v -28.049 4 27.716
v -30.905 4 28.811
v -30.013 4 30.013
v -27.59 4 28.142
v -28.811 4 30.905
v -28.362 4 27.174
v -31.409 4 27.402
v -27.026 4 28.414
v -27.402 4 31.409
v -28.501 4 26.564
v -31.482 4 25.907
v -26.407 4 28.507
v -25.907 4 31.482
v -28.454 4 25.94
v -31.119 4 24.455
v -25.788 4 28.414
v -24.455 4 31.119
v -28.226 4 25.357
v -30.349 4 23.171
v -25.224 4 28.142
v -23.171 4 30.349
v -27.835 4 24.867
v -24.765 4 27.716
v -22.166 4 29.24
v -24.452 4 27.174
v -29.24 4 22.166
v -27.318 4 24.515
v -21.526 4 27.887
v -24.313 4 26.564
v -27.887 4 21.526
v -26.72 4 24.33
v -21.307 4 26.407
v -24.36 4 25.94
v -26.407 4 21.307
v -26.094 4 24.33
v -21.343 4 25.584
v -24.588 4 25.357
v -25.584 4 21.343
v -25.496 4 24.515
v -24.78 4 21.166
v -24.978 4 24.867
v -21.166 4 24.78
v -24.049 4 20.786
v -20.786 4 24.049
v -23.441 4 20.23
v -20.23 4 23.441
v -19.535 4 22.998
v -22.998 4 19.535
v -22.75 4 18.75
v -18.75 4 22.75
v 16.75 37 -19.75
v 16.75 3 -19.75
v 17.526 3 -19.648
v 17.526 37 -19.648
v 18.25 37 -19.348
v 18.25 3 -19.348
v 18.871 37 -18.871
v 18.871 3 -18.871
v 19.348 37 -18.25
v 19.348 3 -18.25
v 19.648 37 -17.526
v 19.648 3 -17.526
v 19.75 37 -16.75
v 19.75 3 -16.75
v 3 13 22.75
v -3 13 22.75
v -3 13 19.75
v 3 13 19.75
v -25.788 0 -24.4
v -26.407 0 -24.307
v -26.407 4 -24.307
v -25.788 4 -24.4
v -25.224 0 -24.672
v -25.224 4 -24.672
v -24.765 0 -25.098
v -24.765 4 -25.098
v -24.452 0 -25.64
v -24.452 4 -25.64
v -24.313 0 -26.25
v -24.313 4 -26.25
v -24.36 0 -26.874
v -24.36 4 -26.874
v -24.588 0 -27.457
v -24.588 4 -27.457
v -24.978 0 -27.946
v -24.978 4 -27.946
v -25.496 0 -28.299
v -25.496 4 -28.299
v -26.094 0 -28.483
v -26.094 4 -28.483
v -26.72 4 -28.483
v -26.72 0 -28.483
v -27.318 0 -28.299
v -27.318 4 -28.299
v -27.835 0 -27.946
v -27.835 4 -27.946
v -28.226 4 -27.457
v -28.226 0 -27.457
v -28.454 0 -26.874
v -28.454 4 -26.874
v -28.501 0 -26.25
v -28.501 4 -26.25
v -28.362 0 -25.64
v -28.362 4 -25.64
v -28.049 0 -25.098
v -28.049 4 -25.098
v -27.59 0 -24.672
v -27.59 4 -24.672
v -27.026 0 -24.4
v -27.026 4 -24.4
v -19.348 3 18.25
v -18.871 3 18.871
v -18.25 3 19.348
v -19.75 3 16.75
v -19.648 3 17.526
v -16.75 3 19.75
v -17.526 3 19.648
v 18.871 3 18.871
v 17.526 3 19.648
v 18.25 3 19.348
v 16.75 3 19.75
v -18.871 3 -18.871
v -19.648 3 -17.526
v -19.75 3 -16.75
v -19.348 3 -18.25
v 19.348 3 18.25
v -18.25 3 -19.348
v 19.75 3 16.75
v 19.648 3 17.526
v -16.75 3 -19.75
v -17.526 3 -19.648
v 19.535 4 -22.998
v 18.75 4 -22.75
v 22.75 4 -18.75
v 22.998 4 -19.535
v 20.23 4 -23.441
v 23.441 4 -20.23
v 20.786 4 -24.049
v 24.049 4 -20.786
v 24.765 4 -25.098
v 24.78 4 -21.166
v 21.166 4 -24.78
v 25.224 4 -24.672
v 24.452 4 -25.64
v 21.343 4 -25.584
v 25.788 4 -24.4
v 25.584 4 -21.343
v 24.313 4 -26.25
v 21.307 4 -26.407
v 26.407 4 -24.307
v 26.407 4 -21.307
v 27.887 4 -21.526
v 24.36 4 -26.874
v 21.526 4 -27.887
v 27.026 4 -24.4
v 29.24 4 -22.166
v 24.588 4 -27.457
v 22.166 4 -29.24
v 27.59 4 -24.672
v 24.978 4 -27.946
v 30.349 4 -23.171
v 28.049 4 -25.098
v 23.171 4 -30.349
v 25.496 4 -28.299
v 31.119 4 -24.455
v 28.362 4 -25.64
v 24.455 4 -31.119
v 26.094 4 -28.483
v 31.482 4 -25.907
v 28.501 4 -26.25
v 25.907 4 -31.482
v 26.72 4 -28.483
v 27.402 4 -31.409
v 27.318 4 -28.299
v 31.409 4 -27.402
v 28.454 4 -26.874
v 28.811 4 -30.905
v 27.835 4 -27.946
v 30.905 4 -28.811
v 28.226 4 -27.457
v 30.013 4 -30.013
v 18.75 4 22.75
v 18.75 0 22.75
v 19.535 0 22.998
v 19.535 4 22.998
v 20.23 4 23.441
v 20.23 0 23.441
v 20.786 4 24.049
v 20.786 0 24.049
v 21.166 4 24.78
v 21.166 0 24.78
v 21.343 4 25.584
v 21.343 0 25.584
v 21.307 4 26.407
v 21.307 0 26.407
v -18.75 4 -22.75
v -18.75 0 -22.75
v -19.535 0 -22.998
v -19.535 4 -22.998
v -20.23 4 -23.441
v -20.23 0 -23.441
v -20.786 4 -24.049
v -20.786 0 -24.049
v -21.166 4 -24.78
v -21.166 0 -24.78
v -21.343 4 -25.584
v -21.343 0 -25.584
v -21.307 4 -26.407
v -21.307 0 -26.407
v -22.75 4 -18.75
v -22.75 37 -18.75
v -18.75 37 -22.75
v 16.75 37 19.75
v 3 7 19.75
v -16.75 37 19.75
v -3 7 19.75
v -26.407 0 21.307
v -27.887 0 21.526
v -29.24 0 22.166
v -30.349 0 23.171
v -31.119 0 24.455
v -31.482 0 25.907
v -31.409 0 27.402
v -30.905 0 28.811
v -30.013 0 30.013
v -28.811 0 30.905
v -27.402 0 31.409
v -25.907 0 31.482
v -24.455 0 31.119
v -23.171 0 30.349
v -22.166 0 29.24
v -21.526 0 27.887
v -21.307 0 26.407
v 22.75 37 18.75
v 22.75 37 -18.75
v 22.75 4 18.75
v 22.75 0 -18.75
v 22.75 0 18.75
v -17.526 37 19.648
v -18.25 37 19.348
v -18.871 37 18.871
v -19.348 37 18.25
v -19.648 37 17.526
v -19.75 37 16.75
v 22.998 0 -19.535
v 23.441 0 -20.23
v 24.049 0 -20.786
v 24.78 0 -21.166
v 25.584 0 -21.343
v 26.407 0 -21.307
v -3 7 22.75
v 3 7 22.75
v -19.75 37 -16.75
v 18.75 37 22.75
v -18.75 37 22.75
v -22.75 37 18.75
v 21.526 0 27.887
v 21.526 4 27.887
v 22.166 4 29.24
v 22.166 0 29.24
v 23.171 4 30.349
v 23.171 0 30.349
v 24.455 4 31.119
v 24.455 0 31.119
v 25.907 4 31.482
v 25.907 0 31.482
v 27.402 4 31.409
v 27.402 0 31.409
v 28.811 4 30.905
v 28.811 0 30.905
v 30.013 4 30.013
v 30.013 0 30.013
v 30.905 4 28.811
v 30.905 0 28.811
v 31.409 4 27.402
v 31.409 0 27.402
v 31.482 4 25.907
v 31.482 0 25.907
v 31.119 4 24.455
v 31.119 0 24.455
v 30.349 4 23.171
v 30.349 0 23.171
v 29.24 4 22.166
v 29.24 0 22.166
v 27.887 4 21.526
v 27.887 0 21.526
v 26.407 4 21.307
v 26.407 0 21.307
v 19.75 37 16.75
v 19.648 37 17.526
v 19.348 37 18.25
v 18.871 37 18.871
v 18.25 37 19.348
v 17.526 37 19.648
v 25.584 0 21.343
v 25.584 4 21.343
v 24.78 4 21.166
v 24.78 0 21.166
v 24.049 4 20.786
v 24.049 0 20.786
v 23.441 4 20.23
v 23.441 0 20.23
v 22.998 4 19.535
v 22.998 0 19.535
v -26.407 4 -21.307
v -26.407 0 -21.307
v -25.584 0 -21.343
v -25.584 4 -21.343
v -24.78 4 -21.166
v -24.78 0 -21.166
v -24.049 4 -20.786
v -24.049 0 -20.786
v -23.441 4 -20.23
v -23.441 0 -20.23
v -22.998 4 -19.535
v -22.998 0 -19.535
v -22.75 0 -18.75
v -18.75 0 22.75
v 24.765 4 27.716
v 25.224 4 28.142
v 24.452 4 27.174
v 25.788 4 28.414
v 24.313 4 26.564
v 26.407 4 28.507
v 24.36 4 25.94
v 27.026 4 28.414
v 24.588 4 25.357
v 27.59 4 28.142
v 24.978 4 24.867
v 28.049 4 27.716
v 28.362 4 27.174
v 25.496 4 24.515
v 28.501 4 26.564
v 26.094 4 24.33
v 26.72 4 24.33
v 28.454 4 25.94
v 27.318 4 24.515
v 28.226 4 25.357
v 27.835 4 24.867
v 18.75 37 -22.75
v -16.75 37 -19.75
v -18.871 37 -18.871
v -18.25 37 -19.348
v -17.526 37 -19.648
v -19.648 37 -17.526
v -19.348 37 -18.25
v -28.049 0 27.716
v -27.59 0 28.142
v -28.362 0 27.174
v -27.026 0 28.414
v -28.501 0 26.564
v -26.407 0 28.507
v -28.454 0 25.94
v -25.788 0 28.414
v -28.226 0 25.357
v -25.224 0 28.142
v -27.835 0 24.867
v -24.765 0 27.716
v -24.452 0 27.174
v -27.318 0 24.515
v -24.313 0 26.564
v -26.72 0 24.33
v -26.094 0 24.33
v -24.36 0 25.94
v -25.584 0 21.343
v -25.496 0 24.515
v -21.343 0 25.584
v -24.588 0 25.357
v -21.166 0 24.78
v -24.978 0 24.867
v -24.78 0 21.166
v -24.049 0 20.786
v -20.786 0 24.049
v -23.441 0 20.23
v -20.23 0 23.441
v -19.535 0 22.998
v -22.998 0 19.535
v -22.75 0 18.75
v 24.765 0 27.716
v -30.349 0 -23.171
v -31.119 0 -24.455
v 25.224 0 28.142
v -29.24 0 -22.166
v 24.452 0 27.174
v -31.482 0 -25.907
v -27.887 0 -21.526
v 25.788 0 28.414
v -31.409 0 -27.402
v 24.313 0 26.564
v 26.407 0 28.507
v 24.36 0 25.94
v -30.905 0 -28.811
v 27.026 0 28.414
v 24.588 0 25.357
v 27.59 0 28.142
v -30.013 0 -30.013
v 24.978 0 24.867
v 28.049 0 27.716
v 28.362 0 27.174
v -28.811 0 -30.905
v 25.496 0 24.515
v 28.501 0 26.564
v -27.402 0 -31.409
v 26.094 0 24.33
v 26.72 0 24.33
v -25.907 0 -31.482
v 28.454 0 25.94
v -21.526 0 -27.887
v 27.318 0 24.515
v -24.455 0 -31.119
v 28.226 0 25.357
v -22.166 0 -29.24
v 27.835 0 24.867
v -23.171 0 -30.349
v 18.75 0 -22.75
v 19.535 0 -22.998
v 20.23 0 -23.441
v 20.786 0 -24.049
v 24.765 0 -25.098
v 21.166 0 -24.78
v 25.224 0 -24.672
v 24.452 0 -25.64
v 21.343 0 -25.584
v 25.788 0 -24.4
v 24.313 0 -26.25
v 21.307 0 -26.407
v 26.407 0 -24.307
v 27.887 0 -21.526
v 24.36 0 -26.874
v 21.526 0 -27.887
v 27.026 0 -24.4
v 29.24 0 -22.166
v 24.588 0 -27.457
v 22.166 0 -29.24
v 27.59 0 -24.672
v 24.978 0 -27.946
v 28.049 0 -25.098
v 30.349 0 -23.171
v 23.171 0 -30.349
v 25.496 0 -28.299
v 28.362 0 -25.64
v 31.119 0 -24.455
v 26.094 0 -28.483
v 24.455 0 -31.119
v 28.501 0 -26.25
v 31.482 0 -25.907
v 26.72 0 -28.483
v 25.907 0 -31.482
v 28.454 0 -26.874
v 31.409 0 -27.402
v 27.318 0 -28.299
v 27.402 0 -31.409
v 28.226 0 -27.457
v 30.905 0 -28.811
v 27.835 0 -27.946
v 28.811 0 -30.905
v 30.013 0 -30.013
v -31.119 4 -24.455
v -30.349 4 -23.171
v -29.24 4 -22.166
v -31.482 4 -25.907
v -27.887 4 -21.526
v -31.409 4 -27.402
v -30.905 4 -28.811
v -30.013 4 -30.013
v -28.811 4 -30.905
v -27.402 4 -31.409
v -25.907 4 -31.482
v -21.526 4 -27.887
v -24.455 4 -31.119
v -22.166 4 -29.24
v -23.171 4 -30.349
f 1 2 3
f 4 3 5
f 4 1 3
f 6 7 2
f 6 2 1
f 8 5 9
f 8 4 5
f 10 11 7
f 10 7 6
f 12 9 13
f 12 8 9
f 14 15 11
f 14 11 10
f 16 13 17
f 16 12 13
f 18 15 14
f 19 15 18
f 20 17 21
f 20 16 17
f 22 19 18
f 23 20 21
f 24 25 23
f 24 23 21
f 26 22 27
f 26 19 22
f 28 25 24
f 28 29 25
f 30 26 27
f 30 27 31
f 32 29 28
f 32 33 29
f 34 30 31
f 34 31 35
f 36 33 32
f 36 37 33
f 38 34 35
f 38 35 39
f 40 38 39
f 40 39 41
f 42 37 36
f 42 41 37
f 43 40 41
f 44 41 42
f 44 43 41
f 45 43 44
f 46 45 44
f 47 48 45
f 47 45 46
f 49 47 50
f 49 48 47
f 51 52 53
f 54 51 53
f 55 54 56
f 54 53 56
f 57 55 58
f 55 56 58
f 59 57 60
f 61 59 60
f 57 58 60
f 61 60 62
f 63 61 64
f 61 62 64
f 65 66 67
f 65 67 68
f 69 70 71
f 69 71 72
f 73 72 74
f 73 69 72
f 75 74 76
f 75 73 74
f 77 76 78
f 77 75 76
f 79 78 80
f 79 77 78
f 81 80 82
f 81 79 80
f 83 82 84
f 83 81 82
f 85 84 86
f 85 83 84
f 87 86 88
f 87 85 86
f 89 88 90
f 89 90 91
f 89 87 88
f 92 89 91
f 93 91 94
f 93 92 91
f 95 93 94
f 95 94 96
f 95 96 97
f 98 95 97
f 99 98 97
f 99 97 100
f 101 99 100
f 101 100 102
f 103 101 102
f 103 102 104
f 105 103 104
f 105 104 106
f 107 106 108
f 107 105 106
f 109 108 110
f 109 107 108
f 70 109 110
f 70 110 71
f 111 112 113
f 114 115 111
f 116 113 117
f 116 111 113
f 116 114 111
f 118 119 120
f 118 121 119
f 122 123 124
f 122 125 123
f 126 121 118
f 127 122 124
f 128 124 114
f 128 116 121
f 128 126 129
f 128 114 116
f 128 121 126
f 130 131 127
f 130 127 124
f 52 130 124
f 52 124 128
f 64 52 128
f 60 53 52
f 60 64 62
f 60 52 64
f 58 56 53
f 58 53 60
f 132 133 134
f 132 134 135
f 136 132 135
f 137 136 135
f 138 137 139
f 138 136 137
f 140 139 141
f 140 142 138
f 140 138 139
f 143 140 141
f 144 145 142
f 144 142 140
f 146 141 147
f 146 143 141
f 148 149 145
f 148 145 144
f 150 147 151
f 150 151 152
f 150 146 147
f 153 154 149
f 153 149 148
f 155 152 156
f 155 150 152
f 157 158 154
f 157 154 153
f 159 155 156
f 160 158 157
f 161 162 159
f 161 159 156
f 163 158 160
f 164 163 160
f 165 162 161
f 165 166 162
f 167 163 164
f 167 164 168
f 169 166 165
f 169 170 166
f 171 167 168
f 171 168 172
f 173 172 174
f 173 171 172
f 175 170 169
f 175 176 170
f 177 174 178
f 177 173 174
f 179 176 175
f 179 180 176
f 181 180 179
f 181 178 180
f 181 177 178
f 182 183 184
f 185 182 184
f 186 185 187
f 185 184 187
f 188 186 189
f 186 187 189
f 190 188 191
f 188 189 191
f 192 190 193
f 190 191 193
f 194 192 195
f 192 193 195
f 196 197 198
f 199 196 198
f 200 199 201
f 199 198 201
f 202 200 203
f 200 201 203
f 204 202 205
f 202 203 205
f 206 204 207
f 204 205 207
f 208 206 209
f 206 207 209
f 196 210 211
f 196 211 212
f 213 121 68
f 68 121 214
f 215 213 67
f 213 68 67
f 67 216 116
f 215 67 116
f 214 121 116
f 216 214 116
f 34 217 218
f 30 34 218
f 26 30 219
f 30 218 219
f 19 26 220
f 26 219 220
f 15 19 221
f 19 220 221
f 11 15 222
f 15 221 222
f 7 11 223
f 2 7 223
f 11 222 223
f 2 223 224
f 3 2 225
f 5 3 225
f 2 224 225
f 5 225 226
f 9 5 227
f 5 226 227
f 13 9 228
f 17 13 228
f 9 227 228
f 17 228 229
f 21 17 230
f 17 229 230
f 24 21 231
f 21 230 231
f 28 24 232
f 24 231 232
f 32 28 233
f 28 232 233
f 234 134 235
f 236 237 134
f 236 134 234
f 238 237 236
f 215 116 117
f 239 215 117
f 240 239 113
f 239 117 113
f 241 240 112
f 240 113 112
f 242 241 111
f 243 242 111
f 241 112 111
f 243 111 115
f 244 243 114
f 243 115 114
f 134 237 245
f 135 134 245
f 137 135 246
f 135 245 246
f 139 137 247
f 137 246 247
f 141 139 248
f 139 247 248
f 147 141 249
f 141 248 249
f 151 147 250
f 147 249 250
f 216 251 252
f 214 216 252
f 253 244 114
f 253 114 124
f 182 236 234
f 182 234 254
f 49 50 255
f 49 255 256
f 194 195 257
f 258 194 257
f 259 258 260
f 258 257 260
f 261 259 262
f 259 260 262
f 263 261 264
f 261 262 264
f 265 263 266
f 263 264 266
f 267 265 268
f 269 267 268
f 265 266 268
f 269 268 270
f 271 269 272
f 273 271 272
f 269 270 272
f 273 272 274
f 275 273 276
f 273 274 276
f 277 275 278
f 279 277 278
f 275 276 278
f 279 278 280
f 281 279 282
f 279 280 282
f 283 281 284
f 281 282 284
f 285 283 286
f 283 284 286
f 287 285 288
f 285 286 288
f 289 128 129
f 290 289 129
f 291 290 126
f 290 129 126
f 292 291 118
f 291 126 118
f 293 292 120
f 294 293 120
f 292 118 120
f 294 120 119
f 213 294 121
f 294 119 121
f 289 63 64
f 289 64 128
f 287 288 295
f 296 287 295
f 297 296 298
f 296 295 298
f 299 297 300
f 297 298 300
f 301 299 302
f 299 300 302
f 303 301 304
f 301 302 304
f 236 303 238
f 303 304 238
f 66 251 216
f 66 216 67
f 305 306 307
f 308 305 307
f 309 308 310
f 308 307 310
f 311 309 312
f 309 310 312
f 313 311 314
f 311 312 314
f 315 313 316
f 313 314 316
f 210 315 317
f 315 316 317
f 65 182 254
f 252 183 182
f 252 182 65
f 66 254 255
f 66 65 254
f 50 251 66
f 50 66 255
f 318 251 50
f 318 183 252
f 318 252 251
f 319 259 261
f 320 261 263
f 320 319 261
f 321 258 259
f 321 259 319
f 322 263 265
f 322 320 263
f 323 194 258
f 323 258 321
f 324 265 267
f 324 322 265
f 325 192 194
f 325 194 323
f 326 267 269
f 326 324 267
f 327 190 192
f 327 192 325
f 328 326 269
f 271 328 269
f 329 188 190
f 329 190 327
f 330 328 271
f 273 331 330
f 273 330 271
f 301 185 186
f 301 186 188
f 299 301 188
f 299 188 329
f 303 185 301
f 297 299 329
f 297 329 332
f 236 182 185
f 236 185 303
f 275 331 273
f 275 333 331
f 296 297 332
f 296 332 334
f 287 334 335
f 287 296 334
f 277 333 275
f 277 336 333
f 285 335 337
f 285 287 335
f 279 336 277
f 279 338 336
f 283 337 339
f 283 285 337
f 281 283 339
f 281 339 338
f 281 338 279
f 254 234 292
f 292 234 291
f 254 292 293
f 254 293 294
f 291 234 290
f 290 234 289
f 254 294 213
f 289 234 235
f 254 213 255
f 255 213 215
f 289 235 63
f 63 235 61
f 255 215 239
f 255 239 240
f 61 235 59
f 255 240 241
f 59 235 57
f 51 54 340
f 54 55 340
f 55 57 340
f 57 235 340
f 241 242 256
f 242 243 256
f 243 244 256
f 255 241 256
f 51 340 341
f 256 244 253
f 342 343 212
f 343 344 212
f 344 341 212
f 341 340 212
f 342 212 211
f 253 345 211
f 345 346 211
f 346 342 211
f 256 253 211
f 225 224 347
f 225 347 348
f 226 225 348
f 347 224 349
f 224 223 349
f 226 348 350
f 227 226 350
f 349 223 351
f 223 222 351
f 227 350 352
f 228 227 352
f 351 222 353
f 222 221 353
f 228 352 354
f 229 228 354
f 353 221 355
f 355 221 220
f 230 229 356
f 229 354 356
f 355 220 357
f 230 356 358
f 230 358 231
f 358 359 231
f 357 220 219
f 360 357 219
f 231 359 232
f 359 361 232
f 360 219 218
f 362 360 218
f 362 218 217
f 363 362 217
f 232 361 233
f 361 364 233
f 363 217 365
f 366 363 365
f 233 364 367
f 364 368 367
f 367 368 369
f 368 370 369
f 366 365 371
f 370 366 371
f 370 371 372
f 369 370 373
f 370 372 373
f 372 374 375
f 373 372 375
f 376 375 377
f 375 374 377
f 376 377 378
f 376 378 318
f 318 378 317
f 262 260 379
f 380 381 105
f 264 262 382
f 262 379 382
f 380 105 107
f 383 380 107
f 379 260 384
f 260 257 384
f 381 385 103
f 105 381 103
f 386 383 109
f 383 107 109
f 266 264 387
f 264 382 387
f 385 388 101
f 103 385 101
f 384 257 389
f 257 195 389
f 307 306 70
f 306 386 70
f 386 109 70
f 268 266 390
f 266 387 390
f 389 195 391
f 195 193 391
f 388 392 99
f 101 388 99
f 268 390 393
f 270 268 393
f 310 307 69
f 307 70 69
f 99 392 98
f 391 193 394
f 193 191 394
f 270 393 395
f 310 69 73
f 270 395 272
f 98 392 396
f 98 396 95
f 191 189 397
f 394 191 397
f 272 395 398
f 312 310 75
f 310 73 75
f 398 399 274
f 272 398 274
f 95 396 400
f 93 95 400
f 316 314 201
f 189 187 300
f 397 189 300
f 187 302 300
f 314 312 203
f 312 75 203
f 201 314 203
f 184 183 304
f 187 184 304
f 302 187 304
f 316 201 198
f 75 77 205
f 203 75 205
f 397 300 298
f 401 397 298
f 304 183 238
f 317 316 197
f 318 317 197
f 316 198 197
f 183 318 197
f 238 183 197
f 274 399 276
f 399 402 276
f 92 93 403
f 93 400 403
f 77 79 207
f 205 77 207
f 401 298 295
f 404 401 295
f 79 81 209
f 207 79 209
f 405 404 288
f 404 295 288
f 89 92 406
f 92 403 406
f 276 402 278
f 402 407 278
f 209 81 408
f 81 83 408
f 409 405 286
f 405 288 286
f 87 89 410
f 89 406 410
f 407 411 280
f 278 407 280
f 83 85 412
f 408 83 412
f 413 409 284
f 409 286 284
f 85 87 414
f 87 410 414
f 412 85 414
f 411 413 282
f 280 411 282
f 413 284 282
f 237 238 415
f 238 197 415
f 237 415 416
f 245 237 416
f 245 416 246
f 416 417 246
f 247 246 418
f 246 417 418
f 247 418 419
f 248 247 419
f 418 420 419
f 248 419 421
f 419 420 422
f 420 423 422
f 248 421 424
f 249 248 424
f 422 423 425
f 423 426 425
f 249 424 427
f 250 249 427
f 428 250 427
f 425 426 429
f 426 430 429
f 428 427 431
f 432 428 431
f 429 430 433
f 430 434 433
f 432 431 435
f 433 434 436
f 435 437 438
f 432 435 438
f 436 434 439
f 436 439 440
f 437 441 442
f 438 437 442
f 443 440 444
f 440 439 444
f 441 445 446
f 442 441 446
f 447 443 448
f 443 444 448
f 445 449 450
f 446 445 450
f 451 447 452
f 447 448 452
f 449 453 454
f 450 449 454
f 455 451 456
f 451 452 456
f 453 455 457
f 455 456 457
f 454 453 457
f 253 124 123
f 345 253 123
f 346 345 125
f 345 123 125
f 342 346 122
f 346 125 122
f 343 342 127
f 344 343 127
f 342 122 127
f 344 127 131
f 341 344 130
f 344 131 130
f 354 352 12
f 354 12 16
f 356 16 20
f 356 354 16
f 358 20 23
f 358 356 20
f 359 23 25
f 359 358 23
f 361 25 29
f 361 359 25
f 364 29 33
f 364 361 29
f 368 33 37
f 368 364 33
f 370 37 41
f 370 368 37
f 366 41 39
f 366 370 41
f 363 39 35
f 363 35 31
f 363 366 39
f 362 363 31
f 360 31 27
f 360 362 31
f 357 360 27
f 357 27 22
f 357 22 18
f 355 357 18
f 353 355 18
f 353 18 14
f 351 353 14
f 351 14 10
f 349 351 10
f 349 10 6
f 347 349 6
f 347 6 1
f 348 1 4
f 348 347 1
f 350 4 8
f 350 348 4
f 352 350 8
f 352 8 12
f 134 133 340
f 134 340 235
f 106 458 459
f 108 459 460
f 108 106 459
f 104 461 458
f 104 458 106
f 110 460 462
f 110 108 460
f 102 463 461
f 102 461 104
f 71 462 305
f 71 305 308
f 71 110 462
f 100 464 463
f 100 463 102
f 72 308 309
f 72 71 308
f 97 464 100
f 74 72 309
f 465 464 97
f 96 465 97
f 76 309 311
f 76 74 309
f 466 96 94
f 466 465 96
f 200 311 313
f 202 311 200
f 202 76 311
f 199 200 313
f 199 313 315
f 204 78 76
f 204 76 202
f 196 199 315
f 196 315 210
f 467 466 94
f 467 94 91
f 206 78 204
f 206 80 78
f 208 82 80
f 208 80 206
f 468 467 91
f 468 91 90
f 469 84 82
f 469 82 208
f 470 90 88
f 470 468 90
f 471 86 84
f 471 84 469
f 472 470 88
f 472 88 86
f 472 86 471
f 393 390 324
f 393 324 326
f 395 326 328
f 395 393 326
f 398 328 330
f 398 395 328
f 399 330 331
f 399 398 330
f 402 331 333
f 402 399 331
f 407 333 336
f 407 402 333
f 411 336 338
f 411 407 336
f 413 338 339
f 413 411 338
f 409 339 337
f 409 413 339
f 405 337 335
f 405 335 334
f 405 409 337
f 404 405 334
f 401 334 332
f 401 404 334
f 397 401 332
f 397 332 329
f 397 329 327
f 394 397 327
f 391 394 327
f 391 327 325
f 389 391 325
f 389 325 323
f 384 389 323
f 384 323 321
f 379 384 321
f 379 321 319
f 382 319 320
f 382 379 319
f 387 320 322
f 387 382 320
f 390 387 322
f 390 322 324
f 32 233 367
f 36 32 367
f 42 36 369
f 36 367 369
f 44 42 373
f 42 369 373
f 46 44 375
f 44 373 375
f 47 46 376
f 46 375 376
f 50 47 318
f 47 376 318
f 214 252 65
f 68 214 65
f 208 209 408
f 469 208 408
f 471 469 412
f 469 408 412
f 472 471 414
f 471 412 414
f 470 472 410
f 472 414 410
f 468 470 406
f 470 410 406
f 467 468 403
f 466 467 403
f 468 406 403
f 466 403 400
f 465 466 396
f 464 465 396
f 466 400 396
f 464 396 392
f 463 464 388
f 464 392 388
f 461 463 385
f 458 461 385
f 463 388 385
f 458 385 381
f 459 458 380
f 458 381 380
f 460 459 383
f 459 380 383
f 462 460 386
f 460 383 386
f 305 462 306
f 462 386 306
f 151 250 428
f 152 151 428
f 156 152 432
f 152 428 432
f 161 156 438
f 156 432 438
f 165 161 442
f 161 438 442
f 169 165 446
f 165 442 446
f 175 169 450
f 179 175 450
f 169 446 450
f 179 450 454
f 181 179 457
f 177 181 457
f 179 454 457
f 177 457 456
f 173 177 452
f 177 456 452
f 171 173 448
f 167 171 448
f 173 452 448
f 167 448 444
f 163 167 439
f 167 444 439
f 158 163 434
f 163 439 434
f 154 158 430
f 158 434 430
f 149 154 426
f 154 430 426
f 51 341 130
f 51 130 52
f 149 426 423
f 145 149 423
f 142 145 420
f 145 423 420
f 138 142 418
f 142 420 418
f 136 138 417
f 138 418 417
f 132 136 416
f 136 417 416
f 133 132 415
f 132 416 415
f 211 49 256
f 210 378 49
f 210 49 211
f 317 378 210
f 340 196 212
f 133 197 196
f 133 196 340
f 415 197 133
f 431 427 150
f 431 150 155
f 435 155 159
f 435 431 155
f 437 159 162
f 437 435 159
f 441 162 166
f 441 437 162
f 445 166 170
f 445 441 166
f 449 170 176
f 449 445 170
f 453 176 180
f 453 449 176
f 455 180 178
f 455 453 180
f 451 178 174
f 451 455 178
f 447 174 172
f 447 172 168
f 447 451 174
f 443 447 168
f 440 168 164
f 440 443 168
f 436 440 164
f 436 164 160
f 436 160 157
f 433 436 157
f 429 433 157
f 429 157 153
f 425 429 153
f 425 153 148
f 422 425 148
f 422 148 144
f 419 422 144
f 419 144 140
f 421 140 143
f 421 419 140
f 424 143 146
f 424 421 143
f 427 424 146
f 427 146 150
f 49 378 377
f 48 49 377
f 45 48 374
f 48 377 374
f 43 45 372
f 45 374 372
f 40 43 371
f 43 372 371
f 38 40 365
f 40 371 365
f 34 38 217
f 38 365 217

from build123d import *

# Parameters (mm, degrees)
ESTRUSIONE_ESTRUSIONE3_DEPTH = 37
ESTRUSIONE_ESTRUSIONE6_DEPTH = 3
SCHIZZO5_R                   = 2.1
ESTRUSIONE_ESTRUSIONE5_DEPTH = 4
SCHIZZO7_W                   = 6
SCHIZZO7_H                   = 6
TAGLIO_ESTRUSIONE1_DEPTH     = 3


with BuildPart() as part:
    # Schizzo1 → Estrusione-Estrusione3 (new body)
    with BuildSketch(Plane(origin=(0, 0, 0), x_dir=(1, 0, 0), z_dir=(0, 1, 0))):
        Polygon((-18.75, 22.75), (18.75, 22.75), (22.75, 18.75), (22.75, -18.75), (18.75, -22.75), (-18.75, -22.75), (-22.75, -18.75), (-22.75, 18.75), align=None)
        with BuildLine():
            Line((-16.75, 19.75), (16.75, 19.75))
            ThreePointArc((16.75, 19.75), (18.871320344, 18.871320344), (19.75, 16.75))
            Line((19.75, 16.75), (19.75, -16.75))
            ThreePointArc((19.75, -16.75), (18.871320344, -18.871320344), (16.75, -19.75))
            Line((16.75, -19.75), (-16.75, -19.75))
            ThreePointArc((-16.75, -19.75), (-18.871320344, -18.871320344), (-19.75, -16.75))
            Line((-19.75, -16.75), (-19.75, 16.75))
            ThreePointArc((-19.75, 16.75), (-18.871320344, 18.871320344), (-16.75, 19.75))
        make_face(mode=Mode.SUBTRACT)
    extrude(amount=ESTRUSIONE_ESTRUSIONE3_DEPTH)

    # Schizzo6 → Estrusione-Estrusione6 (add)
    with BuildSketch(Plane(origin=(0, 0, 0), x_dir=(1, 0, 0), z_dir=(0, 1, 0))):
        Polygon((-18.75, 22.75), (-22.75, 18.75), (-22.75, -18.75), (-18.75, -22.75), (18.75, -22.75), (22.75, -18.75), (22.75, 18.75), (18.75, 22.75), align=None)
    extrude(amount=ESTRUSIONE_ESTRUSIONE6_DEPTH)

    # Schizzo5 → Estrusione-Estrusione5 (add)
    # profile 1 of 4: a face of its own
    with BuildSketch(Plane(origin=(0, 0, 0), x_dir=(1, 0, 0), z_dir=(0, 1, 0))):
        with BuildLine():
            Line((-22.75, 18.75), (-18.75, 22.75))
            ThreePointArc((-18.75, 22.75), (-20.785786438, 24.048885271), (-21.306854249, 26.406854249))
            ThreePointArc((-21.306854249, 26.406854249), (-30.013098834, 30.013098834), (-26.406854249, 21.306854249))
            ThreePointArc((-26.406854249, 21.306854249), (-24.048885271, 20.785786438), (-22.75, 18.75))
        make_face()
        with Locations(Location((-26.406854249, 26.406854249, 0), (0, 0, 270))):
            Circle(SCHIZZO5_R, mode=Mode.SUBTRACT)
    # profile 2 of 4: a face of its own
    with BuildSketch(Plane(origin=(0, 0, 0), x_dir=(1, 0, 0), z_dir=(0, 1, 0))):
        with BuildLine():
            Line((18.75, 22.75), (22.75, 18.75))
            ThreePointArc((22.75, 18.75), (24.048885271, 20.785786438), (26.406854249, 21.306854249))
            ThreePointArc((26.406854249, 21.306854249), (30.013098834, 30.013098834), (21.306854249, 26.406854249))
            ThreePointArc((21.306854249, 26.406854249), (20.785786438, 24.048885271), (18.75, 22.75))
        make_face()
        with Locations(Location((26.406854249, 26.406854249, 0), (0, 0, 270))):
            Circle(SCHIZZO5_R, mode=Mode.SUBTRACT)
    # profile 3 of 4: a face of its own
    with BuildSketch(Plane(origin=(0, 0, 0), x_dir=(1, 0, 0), z_dir=(0, 1, 0))):
        with BuildLine():
            Line((22.75, -18.75), (18.75, -22.75))
            ThreePointArc((18.75, -22.75), (20.785786438, -24.048885271), (21.306854249, -26.406854249))
            ThreePointArc((21.306854249, -26.406854249), (30.013098834, -30.013098834), (26.406854249, -21.306854249))
            ThreePointArc((26.406854249, -21.306854249), (24.048885271, -20.785786438), (22.75, -18.75))
        make_face()
        with Locations(Location((26.406854249, -26.406854249, 0), (0, 0, 270))):
            Circle(SCHIZZO5_R, mode=Mode.SUBTRACT)
    # profile 4 of 4: a face of its own
    with BuildSketch(Plane(origin=(0, 0, 0), x_dir=(1, 0, 0), z_dir=(0, 1, 0))):
        with BuildLine():
            Line((-18.75, -22.75), (-22.75, -18.75))
            ThreePointArc((-22.75, -18.75), (-24.048885271, -20.785786438), (-26.406854249, -21.306854249))
            ThreePointArc((-26.406854249, -21.306854249), (-30.013098834, -30.013098834), (-21.306854249, -26.406854249))
            ThreePointArc((-21.306854249, -26.406854249), (-20.785786438, -24.048885271), (-18.75, -22.75))
        make_face()
        with Locations(Location((-26.406854249, -26.406854249, 0), (0, 0, 270))):
            Circle(SCHIZZO5_R, mode=Mode.SUBTRACT)
    extrude(amount=ESTRUSIONE_ESTRUSIONE5_DEPTH)

    # Schizzo7 → Taglio-Estrusione1 (cut)
    with BuildSketch(Plane.XY.offset(22.75)):
        with Locations((0, 10)):
            Rectangle(SCHIZZO7_W, SCHIZZO7_H)
    extrude(amount=-TAGLIO_ESTRUSIONE1_DEPTH, mode=Mode.SUBTRACT)


solid = part.part
